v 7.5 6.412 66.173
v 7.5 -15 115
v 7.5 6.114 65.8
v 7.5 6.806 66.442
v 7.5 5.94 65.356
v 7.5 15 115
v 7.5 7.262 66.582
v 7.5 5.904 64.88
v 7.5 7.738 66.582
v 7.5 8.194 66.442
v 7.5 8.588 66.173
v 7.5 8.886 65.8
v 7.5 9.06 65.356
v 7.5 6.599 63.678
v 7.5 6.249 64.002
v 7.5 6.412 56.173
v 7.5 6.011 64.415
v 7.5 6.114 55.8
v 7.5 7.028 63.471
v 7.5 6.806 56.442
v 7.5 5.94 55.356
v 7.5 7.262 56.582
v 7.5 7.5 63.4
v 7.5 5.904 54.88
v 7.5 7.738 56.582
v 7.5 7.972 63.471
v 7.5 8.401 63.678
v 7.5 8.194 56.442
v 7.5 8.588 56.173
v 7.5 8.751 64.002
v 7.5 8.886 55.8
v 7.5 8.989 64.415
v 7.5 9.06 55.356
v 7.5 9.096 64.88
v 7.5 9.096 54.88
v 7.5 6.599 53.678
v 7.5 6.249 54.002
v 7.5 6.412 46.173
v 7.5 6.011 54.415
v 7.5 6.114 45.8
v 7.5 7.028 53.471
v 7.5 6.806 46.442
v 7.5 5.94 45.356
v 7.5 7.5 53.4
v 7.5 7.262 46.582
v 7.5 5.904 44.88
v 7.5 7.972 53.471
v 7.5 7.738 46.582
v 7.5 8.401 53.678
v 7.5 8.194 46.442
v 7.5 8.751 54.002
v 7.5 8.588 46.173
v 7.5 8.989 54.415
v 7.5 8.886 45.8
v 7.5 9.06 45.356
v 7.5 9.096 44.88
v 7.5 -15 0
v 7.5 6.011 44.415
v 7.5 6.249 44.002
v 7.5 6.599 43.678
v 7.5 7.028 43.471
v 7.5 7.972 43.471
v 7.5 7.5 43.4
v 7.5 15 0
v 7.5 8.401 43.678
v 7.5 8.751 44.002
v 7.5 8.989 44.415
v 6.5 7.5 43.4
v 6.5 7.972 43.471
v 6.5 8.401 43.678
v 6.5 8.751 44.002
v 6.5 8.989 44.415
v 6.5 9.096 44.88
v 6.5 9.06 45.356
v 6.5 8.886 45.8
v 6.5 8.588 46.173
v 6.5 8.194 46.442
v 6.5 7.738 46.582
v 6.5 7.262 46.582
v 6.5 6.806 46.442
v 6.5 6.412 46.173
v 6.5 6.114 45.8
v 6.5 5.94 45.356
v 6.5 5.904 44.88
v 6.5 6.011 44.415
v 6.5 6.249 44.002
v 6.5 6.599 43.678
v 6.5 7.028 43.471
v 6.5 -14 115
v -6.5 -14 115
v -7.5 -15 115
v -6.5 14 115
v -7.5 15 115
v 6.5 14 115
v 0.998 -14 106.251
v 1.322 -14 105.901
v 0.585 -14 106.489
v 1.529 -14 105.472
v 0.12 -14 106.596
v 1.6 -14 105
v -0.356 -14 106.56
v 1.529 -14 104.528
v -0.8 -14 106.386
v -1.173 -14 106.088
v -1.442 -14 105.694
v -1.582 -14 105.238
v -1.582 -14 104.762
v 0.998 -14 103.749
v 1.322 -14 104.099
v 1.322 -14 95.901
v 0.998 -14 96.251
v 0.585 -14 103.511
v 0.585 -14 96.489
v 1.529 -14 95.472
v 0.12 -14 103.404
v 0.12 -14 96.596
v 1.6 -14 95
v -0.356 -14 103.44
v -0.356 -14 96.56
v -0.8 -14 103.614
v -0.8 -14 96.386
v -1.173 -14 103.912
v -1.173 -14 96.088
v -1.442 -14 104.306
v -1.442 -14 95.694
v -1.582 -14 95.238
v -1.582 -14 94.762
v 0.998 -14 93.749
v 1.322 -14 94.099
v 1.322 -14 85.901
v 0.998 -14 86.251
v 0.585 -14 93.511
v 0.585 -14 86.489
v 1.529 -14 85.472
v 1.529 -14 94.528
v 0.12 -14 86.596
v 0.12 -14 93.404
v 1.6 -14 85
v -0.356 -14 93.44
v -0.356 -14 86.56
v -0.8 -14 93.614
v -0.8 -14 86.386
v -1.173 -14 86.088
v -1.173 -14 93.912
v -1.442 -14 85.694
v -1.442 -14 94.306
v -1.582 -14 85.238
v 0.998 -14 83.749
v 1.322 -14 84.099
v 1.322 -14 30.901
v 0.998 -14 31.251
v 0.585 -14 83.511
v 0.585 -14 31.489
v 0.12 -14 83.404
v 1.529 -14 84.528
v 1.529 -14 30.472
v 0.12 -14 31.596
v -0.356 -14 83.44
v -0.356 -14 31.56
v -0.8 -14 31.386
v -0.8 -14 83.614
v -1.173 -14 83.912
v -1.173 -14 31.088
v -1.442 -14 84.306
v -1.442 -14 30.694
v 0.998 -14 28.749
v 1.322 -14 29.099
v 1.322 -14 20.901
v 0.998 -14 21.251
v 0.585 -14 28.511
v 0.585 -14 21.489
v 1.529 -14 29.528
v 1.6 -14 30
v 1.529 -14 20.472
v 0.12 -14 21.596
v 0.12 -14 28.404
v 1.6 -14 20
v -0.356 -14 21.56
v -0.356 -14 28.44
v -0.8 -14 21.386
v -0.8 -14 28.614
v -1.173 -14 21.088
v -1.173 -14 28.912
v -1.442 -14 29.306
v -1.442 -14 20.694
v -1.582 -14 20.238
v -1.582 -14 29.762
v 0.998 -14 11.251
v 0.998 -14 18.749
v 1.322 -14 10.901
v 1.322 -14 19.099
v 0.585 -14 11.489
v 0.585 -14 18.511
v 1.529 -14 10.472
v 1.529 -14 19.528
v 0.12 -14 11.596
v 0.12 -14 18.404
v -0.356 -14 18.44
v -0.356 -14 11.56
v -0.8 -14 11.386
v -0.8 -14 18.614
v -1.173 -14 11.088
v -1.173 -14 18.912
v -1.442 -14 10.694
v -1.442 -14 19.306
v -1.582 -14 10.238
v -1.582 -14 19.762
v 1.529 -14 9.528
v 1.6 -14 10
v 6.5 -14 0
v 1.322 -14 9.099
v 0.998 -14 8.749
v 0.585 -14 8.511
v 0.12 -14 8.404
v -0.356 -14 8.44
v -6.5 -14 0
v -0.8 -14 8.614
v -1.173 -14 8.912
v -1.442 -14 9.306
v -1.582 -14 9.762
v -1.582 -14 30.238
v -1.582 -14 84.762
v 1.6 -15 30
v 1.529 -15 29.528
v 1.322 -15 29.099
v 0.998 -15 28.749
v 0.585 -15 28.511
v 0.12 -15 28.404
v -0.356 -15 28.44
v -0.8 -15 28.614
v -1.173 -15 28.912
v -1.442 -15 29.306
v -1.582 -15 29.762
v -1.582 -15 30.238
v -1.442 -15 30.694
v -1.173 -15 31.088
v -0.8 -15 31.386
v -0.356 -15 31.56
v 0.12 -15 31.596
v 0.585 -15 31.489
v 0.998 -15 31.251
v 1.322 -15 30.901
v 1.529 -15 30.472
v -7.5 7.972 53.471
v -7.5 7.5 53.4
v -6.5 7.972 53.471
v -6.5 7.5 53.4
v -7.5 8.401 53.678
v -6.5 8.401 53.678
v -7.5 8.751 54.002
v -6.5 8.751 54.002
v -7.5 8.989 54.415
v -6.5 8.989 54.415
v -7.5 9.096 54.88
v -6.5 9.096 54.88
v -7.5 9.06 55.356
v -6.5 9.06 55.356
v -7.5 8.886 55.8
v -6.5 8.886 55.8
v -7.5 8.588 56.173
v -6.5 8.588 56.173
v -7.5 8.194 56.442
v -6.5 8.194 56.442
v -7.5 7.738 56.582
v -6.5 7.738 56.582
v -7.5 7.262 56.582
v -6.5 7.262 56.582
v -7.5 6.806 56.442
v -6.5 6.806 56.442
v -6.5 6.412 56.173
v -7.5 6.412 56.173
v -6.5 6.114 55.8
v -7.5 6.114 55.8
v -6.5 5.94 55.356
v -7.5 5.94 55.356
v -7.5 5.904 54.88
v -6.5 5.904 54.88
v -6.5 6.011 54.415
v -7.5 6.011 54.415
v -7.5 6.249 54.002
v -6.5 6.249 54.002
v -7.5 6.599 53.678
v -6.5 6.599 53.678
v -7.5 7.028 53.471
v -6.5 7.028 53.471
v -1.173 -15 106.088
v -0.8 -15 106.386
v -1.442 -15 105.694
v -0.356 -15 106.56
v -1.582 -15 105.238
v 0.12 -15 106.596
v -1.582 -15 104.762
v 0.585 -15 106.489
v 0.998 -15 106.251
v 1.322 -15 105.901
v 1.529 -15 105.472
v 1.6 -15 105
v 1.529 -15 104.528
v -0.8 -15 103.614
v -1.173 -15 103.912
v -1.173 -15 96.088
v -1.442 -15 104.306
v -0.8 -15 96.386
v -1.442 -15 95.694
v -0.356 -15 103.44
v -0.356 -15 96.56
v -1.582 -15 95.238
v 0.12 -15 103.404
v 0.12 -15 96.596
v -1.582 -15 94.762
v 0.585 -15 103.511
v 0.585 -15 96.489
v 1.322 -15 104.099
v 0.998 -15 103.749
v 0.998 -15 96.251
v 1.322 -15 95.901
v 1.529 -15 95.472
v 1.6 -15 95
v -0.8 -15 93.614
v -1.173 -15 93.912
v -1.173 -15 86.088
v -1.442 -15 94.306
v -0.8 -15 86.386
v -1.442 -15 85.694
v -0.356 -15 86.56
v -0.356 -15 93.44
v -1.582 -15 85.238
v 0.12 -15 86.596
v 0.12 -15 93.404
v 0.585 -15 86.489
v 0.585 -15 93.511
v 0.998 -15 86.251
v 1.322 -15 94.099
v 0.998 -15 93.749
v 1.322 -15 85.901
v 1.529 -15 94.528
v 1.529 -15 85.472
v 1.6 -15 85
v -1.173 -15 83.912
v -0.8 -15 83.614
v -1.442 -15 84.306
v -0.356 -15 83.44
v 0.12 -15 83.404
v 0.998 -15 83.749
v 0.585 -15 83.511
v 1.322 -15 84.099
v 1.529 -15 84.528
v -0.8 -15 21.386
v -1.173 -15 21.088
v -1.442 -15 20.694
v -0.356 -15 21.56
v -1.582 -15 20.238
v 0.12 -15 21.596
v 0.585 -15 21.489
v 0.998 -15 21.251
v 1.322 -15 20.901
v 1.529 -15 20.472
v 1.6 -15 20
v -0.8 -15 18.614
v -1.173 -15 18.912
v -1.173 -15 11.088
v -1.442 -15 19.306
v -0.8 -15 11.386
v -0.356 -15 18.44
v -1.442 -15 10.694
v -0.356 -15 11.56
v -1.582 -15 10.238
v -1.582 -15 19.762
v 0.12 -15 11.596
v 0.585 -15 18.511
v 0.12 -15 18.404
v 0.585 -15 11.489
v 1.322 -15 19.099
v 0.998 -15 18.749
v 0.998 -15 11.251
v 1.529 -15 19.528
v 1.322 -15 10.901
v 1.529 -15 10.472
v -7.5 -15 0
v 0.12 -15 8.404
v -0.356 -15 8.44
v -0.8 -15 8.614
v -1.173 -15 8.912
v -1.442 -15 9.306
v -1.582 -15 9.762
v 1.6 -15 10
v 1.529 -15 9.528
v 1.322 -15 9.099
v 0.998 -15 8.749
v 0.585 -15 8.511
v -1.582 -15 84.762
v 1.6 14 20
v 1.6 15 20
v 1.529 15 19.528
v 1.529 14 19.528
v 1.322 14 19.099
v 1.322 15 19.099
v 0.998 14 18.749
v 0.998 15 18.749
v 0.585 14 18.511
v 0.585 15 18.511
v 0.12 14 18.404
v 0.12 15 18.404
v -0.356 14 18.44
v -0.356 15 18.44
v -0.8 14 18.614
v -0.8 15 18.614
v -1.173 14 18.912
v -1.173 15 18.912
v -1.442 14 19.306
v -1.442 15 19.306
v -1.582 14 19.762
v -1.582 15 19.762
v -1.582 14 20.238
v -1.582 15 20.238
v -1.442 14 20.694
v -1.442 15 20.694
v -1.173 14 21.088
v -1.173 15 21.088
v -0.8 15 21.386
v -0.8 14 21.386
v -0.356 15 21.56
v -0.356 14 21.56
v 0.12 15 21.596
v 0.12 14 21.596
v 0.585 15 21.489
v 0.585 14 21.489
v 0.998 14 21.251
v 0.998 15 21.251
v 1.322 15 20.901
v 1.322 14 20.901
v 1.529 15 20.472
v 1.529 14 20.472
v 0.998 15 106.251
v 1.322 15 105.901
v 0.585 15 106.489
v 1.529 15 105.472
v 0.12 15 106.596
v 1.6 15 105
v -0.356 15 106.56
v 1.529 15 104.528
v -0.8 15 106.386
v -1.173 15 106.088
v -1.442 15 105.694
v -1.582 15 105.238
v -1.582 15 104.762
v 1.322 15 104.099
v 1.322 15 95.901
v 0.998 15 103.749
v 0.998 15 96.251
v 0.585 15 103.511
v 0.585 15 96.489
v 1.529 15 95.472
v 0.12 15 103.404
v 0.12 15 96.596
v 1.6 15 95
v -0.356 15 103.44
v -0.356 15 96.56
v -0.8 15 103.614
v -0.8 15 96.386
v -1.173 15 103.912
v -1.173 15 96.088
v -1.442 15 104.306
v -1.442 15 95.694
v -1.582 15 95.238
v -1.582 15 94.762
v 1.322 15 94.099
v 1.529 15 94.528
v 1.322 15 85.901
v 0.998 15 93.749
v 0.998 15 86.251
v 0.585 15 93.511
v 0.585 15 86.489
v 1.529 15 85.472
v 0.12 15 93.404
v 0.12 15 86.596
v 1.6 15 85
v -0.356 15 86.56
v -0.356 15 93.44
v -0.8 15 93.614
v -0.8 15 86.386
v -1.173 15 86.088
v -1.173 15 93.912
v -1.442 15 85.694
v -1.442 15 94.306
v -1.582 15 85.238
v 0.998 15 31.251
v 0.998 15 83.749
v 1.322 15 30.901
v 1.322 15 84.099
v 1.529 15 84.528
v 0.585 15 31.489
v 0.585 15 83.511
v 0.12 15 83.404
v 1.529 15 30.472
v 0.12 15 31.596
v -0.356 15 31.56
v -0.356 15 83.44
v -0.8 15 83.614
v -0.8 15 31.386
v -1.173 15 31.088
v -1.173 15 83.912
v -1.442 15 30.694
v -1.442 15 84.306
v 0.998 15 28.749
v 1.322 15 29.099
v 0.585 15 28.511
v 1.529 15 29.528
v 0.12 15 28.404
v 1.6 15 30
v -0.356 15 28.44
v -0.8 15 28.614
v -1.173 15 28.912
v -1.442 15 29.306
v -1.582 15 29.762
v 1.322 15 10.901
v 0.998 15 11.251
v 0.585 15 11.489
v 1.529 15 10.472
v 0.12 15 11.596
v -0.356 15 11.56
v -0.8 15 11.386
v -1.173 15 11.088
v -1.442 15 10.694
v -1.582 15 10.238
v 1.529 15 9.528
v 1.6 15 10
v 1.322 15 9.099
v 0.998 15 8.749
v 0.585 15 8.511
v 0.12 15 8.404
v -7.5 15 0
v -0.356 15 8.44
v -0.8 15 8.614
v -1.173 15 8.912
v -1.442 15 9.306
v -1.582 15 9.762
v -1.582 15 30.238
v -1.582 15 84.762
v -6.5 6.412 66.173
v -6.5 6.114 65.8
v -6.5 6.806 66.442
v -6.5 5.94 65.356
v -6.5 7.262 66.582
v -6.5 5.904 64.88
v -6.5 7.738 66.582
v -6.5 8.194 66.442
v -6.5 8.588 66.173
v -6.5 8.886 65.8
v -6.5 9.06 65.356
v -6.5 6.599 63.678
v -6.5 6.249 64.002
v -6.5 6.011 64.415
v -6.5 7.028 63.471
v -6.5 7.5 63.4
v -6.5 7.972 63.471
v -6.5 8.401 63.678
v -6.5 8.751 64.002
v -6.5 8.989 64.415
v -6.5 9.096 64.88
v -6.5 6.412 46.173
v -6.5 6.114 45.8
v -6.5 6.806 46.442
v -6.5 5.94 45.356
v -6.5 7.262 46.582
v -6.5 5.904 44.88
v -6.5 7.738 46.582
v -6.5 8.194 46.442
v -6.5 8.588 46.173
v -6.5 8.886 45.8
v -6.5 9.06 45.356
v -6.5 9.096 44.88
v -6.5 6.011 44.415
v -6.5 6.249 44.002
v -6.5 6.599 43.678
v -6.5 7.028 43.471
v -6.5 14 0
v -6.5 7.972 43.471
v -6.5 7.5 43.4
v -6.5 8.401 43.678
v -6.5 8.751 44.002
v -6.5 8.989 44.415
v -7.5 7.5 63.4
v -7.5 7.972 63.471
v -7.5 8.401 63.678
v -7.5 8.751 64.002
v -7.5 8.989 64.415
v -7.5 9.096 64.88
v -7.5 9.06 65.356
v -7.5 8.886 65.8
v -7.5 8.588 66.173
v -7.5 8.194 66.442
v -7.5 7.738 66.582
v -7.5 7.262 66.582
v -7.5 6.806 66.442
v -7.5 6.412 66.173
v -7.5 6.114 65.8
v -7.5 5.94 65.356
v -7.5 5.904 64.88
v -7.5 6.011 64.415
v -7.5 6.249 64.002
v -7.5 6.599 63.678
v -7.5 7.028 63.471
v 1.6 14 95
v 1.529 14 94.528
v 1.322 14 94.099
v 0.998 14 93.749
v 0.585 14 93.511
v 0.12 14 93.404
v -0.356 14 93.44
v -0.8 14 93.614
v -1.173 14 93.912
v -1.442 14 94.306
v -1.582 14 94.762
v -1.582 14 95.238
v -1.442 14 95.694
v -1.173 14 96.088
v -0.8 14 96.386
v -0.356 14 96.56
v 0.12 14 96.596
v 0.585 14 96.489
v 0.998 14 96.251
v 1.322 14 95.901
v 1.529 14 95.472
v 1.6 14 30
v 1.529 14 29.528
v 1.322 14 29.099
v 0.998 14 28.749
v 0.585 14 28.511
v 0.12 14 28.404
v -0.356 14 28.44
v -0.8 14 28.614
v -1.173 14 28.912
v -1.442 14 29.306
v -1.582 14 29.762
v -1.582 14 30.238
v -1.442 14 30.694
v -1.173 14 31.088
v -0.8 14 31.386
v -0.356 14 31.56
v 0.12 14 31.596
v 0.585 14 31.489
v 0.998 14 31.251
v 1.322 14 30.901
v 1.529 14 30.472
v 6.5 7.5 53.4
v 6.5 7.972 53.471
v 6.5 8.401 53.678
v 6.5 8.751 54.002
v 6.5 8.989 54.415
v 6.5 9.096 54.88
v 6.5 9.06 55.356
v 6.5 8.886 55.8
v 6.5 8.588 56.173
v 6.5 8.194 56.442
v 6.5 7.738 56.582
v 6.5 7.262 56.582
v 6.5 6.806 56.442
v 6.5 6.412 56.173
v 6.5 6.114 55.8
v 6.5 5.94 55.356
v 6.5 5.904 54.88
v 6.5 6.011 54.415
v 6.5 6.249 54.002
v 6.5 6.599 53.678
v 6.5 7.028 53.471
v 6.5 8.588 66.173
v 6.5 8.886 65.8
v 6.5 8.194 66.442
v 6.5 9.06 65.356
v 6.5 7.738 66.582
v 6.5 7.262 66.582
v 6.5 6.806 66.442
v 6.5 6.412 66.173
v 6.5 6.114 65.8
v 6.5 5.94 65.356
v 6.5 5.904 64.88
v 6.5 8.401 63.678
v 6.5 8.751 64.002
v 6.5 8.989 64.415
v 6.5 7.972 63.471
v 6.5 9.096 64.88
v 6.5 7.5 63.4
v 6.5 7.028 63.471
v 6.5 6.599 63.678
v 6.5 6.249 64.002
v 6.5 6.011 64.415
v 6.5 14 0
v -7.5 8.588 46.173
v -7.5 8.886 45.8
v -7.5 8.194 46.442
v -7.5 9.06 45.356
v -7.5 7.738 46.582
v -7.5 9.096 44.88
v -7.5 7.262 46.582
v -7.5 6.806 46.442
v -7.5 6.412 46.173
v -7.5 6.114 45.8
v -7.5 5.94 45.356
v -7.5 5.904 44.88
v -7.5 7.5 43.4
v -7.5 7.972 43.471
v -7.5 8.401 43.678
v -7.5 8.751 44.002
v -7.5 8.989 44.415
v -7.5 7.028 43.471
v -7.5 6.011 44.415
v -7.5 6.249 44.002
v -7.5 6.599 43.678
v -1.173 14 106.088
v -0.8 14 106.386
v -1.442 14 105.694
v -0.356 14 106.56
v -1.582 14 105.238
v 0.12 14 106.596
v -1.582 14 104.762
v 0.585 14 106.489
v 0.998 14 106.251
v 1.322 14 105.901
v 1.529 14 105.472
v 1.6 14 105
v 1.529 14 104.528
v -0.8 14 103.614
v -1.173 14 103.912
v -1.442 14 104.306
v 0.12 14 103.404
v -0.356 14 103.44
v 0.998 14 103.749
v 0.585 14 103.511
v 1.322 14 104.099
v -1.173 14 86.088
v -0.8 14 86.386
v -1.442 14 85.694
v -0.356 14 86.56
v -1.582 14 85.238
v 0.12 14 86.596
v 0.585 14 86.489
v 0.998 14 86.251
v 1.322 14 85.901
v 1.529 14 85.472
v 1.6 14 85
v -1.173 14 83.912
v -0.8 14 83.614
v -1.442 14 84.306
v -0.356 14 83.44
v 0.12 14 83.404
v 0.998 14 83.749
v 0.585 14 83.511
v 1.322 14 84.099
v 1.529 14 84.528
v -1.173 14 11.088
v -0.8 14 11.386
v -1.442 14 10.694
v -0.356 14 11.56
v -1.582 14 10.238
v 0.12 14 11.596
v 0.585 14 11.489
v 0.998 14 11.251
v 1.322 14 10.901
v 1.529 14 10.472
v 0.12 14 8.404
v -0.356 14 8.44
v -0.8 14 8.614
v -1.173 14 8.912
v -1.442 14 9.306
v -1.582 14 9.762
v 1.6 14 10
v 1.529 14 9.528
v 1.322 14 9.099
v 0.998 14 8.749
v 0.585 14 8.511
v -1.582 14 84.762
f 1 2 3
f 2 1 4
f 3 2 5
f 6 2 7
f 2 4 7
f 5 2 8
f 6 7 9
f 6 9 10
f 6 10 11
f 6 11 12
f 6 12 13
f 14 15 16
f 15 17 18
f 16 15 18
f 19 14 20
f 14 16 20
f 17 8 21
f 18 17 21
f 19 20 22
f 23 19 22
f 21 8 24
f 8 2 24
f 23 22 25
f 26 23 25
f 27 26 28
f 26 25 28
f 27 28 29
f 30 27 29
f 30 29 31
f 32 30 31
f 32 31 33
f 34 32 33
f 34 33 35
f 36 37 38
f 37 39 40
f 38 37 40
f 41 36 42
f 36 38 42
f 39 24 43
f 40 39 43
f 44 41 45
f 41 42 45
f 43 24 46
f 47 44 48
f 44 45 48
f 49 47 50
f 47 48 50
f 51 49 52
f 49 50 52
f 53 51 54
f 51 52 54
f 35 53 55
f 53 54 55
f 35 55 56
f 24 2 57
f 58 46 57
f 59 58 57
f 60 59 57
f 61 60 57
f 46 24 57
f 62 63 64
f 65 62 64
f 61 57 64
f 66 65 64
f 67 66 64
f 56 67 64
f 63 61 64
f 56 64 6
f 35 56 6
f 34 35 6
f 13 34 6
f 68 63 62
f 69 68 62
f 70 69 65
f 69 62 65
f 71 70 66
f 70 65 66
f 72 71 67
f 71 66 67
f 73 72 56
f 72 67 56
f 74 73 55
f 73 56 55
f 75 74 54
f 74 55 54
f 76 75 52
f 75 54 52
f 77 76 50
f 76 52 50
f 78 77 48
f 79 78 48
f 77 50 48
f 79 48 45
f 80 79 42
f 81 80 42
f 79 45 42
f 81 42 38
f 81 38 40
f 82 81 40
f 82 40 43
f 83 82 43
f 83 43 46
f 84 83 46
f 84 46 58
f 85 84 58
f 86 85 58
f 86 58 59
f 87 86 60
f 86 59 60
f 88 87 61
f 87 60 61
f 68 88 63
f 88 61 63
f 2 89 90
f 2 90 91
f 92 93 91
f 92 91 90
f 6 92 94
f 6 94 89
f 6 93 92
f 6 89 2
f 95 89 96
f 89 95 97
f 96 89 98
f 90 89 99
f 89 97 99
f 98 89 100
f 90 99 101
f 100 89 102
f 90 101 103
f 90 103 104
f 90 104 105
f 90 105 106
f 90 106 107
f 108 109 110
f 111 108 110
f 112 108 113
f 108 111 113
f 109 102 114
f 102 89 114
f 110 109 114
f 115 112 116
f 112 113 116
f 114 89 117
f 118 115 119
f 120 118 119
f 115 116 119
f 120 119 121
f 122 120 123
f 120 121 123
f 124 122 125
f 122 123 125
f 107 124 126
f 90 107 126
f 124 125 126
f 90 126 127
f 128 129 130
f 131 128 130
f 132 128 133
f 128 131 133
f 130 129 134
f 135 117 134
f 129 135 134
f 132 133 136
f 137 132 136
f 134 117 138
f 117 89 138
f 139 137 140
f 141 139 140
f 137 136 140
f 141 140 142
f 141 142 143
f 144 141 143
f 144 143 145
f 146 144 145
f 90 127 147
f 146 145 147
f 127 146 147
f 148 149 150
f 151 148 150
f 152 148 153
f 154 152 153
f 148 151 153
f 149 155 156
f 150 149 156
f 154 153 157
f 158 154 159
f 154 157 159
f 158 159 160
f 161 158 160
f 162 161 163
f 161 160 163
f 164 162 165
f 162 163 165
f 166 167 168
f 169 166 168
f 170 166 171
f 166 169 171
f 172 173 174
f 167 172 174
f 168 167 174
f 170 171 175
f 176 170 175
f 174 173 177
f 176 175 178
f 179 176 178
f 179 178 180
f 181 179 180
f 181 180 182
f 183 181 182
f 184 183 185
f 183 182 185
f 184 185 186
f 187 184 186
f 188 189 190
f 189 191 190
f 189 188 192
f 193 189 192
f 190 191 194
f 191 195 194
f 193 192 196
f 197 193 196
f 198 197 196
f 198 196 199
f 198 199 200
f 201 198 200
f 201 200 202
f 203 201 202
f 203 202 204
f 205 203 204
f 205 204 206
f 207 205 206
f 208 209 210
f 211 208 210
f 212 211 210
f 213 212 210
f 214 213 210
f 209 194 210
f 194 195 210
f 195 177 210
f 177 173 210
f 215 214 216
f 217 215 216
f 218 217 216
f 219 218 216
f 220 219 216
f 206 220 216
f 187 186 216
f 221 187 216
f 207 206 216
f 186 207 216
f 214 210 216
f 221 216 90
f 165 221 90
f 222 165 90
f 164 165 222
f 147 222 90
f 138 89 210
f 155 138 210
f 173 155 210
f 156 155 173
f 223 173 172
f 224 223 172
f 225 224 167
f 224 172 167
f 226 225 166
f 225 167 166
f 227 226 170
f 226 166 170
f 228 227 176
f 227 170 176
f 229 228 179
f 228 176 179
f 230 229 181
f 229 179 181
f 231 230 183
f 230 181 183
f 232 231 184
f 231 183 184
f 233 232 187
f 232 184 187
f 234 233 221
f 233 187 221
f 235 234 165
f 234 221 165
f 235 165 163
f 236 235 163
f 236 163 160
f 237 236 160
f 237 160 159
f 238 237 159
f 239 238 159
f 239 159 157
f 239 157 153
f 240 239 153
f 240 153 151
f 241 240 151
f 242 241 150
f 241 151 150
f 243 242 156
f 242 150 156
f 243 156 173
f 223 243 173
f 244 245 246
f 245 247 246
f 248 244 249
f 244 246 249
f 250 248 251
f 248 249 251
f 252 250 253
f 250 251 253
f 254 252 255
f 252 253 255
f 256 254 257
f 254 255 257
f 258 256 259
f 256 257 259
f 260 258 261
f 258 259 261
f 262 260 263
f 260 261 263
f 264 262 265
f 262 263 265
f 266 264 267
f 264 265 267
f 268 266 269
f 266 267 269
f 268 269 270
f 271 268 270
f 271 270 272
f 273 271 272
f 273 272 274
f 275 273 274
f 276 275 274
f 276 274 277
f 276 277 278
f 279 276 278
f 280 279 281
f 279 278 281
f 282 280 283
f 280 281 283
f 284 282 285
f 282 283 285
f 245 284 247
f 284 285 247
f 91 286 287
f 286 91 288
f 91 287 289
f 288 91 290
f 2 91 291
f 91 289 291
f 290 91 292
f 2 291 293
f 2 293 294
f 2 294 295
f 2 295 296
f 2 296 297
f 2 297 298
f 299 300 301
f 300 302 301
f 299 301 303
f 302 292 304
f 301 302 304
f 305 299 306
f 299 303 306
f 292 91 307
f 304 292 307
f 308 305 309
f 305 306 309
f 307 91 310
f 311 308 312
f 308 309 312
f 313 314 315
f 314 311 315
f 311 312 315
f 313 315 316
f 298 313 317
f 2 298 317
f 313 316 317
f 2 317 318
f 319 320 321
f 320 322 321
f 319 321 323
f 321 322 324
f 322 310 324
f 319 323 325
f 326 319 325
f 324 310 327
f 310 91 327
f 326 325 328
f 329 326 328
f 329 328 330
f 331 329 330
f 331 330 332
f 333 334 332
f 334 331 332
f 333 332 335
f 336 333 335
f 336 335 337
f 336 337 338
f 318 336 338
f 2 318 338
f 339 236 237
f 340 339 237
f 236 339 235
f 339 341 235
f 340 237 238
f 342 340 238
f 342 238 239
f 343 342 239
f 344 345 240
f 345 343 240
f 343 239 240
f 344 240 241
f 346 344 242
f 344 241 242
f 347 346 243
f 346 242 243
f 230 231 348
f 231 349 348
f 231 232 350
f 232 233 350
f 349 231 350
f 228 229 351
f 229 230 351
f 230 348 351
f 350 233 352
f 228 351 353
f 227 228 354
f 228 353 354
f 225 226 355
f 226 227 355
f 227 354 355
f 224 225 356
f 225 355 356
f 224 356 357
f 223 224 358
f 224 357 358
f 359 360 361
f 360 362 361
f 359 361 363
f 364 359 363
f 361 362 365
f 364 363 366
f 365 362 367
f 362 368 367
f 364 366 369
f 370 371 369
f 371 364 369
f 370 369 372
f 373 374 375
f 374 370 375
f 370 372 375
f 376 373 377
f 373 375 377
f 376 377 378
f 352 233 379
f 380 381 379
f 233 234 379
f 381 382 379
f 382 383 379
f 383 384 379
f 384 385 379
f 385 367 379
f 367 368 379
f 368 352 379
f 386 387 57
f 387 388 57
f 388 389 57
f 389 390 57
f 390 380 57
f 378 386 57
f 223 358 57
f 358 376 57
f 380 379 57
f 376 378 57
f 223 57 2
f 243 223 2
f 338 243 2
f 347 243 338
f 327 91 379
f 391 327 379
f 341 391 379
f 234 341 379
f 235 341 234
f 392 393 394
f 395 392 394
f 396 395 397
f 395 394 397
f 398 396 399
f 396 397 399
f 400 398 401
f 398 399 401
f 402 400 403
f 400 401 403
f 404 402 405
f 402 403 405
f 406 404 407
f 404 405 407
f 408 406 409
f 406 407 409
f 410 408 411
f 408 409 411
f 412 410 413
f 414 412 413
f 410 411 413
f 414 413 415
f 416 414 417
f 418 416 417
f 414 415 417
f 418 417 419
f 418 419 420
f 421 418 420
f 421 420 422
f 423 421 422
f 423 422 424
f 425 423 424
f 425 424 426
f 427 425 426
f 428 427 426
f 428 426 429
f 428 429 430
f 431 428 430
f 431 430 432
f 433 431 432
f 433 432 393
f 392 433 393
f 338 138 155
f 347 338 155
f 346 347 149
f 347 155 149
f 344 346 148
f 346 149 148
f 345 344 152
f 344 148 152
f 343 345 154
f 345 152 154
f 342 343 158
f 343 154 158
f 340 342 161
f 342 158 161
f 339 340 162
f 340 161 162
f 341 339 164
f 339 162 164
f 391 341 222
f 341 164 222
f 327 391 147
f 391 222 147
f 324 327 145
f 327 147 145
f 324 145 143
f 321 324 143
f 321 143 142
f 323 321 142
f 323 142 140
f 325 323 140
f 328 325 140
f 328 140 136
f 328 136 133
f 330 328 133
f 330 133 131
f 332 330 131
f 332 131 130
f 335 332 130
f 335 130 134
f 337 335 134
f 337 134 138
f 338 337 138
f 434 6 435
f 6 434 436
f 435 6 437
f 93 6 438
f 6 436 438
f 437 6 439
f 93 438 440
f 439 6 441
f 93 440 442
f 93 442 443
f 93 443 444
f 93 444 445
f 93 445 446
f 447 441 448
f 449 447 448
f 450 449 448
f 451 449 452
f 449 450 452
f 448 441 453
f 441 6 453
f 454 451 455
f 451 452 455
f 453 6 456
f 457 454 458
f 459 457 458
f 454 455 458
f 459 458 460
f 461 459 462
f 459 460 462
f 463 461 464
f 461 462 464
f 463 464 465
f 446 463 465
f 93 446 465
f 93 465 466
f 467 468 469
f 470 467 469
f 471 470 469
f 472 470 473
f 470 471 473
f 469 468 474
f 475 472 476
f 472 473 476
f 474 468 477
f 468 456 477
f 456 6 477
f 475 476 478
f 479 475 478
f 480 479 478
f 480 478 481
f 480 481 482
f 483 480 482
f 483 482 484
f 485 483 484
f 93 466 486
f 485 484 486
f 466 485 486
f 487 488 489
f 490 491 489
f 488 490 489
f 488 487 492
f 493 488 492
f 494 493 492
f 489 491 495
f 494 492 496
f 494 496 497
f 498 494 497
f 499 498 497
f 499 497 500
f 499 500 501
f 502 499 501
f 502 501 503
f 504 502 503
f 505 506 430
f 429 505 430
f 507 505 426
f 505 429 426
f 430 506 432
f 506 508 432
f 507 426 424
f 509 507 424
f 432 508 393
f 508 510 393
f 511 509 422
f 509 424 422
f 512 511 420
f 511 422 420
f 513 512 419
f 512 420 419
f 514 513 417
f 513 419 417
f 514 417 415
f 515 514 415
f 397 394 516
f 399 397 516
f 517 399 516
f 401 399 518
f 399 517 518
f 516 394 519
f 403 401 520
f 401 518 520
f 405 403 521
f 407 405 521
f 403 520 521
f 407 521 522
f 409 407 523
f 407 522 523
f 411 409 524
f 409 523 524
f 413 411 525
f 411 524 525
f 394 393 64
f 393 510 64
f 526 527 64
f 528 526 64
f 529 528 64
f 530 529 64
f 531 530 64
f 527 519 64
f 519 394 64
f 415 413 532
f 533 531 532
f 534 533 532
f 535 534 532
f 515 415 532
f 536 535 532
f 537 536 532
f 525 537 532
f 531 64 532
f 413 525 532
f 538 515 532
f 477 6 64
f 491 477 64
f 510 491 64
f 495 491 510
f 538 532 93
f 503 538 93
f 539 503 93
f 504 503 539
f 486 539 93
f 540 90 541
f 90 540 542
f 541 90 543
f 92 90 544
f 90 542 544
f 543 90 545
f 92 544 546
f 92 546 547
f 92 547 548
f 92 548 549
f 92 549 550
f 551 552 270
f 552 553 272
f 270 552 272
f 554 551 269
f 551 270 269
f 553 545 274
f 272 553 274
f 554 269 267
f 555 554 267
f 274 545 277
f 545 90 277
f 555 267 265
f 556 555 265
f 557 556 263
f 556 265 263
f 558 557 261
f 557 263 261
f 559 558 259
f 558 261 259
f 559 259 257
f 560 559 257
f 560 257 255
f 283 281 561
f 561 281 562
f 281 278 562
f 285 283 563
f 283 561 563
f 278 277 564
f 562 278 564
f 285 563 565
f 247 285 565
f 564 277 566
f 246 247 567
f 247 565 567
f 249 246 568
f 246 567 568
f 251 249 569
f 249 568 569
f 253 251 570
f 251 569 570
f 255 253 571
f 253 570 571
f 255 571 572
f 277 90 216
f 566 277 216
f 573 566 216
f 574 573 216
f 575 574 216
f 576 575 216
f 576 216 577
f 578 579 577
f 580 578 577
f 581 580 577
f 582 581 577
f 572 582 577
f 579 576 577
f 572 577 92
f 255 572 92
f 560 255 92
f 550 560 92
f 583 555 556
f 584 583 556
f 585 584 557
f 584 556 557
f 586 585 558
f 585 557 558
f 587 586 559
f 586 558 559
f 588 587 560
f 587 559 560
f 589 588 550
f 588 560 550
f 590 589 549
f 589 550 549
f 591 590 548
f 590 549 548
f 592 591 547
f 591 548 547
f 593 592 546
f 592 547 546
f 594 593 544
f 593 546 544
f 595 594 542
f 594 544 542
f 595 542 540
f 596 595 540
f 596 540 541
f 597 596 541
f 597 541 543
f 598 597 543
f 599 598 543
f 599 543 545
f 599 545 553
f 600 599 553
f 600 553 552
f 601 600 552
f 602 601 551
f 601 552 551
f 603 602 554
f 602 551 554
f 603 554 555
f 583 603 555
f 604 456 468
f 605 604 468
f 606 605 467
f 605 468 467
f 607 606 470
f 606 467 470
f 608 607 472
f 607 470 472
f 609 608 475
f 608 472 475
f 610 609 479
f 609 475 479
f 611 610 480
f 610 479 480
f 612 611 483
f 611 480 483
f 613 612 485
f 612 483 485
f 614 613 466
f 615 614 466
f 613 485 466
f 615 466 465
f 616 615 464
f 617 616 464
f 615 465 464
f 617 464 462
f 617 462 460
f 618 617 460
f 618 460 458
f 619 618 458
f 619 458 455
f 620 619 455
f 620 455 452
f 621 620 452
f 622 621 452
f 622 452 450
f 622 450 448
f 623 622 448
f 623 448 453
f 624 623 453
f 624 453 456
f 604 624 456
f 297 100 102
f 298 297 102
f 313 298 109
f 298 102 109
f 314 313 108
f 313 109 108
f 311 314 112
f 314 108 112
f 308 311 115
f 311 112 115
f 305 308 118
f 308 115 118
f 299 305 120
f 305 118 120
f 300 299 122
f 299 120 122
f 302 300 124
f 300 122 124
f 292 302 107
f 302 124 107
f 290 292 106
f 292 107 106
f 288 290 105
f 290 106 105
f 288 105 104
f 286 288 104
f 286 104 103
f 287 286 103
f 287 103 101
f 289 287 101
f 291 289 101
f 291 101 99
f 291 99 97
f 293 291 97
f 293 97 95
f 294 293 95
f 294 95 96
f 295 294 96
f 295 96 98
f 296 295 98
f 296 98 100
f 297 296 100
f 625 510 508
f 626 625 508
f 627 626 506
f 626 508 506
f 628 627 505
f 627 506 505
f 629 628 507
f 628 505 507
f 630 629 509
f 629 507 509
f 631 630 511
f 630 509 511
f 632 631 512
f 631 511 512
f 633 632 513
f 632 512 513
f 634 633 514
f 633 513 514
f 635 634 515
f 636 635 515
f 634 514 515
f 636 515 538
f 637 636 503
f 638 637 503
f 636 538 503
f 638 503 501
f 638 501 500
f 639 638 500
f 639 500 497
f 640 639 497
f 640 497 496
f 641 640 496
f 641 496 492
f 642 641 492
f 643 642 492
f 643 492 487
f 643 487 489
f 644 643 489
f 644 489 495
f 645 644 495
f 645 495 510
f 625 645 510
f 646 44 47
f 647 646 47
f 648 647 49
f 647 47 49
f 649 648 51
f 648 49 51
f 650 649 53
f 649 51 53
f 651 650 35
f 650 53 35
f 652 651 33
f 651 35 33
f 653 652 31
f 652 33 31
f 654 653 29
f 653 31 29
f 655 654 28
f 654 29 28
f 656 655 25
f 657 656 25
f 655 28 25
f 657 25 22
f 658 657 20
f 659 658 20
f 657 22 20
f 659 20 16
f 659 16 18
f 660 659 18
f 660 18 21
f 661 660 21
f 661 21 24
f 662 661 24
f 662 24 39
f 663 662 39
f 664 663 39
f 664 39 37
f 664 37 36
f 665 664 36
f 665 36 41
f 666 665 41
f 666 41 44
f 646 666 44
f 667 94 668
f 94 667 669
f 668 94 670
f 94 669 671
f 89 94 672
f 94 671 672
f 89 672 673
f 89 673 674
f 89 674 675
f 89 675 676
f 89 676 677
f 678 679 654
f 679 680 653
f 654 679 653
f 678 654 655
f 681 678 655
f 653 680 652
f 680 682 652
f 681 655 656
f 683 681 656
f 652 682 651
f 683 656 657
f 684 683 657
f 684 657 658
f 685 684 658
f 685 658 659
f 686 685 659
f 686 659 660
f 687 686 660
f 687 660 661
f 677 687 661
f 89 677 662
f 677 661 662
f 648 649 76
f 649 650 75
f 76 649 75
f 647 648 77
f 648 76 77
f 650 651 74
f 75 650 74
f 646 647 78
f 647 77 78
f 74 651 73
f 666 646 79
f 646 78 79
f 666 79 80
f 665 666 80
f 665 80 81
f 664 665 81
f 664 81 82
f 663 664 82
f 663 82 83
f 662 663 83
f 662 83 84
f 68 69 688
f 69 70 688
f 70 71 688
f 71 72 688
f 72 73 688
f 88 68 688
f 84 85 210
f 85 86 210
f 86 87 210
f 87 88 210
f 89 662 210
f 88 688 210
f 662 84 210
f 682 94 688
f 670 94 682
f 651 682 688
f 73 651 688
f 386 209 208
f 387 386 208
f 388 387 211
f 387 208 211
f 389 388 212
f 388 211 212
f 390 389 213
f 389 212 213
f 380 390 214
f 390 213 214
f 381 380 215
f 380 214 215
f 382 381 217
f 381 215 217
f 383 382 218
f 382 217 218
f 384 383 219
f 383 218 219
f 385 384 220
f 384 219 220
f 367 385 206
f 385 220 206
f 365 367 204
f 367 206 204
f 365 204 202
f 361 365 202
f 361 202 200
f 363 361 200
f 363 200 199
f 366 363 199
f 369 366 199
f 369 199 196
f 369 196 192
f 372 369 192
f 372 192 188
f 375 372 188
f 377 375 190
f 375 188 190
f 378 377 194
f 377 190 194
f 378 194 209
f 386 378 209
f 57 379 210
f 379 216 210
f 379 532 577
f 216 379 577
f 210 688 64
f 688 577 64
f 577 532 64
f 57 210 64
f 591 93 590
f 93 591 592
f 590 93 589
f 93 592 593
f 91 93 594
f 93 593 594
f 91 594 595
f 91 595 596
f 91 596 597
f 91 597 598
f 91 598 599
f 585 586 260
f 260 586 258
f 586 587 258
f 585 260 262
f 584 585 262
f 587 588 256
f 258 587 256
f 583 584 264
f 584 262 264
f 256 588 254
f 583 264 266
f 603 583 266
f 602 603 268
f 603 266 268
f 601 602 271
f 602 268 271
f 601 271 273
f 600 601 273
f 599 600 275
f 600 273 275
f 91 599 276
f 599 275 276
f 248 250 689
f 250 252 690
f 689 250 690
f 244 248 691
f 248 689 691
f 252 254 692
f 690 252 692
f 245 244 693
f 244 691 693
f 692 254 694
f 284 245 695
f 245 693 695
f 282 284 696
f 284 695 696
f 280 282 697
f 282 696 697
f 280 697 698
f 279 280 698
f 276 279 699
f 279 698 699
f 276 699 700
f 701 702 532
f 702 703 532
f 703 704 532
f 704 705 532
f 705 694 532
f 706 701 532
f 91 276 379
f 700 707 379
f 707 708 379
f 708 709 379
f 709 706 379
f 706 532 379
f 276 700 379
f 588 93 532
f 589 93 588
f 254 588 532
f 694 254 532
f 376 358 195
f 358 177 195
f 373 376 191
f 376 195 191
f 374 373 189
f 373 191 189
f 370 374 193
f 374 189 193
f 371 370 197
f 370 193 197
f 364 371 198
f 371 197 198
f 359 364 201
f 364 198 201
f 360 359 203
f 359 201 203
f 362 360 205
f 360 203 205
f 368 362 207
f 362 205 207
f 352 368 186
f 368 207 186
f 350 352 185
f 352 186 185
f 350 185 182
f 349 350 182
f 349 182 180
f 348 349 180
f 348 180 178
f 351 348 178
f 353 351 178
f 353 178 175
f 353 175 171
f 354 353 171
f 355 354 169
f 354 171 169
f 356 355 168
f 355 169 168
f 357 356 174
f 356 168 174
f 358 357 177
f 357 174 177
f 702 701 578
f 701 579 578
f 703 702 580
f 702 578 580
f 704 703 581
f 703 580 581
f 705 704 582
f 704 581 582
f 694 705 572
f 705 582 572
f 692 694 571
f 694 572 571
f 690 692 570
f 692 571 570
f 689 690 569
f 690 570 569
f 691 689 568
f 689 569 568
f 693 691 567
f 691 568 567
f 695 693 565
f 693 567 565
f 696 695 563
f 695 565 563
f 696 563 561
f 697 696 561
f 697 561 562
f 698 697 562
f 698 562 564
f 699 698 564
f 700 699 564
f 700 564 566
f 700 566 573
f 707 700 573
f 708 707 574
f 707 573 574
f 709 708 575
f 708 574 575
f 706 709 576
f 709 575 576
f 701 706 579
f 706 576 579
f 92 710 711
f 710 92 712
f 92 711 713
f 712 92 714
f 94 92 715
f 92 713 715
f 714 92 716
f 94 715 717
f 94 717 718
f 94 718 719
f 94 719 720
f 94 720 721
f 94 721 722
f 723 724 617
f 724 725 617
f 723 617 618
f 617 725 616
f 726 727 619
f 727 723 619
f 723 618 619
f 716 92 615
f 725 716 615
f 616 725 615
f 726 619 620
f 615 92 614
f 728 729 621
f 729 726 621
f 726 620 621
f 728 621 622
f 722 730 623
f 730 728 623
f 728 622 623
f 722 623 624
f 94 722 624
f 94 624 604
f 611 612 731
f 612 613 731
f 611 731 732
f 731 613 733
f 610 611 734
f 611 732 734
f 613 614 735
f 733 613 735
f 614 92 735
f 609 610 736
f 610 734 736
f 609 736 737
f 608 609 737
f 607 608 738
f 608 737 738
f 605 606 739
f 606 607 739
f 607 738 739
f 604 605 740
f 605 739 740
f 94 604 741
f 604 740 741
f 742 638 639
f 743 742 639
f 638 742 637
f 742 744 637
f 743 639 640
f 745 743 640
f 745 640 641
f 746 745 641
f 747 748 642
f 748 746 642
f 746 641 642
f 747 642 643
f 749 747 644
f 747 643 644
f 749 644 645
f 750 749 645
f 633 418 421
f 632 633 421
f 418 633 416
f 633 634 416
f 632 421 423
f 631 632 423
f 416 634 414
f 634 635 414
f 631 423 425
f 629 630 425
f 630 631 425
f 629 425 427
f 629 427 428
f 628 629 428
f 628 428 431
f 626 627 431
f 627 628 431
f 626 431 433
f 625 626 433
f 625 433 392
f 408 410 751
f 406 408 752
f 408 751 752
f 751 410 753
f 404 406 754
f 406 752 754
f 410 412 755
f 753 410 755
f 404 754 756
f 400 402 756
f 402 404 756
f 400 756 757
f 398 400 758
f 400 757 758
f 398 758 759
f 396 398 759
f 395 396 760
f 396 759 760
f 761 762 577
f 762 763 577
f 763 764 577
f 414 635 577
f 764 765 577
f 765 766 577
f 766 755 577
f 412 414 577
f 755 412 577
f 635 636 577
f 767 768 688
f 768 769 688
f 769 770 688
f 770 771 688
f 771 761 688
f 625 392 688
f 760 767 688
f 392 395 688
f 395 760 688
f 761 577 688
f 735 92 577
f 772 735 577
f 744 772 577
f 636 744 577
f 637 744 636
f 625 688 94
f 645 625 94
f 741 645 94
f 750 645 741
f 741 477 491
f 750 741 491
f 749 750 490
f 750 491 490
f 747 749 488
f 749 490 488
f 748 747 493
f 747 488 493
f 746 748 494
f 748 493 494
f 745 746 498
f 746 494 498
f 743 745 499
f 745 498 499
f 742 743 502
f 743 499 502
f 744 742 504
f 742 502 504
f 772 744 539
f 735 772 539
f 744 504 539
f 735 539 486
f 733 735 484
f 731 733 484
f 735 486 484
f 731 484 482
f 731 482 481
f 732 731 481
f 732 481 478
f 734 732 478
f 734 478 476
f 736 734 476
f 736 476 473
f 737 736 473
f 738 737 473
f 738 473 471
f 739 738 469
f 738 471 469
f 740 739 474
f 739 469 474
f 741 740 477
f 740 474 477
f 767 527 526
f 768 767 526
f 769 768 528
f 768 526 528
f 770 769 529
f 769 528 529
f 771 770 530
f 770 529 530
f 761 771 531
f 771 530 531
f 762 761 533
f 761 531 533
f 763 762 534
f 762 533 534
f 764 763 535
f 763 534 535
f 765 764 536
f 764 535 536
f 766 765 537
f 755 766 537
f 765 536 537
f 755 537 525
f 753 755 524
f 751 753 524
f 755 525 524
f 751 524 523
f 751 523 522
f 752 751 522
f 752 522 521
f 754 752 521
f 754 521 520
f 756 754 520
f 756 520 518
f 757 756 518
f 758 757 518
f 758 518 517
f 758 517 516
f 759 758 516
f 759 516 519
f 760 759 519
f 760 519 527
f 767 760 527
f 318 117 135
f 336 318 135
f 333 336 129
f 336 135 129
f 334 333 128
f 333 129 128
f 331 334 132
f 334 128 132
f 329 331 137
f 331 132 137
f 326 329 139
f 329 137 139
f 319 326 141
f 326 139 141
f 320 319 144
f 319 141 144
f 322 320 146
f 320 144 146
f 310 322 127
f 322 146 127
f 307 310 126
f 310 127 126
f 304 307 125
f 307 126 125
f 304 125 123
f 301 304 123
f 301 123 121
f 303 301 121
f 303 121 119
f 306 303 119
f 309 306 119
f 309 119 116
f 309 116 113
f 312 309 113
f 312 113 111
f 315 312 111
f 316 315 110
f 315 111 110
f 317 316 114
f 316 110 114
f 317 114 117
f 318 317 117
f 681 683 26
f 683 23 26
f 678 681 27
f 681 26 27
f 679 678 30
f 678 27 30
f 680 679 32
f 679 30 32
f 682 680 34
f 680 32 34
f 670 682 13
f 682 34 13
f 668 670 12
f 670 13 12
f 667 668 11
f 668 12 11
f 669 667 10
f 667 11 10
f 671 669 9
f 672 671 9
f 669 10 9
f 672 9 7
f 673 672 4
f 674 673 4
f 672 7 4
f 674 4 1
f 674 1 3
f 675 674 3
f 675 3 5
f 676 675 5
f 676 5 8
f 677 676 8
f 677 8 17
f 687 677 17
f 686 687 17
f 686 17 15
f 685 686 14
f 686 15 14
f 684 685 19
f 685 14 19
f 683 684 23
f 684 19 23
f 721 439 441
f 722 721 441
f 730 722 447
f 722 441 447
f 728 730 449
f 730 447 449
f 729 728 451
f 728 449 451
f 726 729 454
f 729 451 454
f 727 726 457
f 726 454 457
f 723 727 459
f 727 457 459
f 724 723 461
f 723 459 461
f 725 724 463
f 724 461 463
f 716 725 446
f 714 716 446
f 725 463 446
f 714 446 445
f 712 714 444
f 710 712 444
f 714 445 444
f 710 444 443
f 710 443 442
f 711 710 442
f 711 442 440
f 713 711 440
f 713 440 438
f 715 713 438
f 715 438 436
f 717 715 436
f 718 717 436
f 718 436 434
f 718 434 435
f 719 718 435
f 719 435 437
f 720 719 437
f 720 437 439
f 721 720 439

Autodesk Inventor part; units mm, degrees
ref_plane "YZ Plane" through (0, 0, 0) normal (1, 0, 0) x (0, 1, 0)
ref_plane "XZ Plane" through (0, 0, 0) normal (0, 1, 0) x (-1, 0, 0)
ref_plane "XY Plane" through (0, 0, 0) normal (0, 0, 1) x (1, 0, 0)
sketch "スケッチ1" plane through (0, 0, 0) normal (0, 0, 1) x (1, 0, 0)
  line L0 (7.5, 15) -> (-7.5, 15)
  line L1 (-7.5, 15) -> (-7.5, -15)
  line L2 (-7.5, -15) -> (7.5, -15)
  line L3 (7.5, -15) -> (7.5, 15)
  line L4 (7.5, 15) -> (-7.5, -15) construction
  line L5 (-7.5, 15) -> (7.5, -15) construction
  line L6 (-6.5, 14) -> (6.5, 14)
  line L7 (6.5, 14) -> (6.5, -14)
  line L8 (6.5, -14) -> (-6.5, -14)
  line L9 (-6.5, -14) -> (-6.5, 14)
  point P0 (0, 0)
  dimension "d0" = 15
  dimension "d1" = 30
  dimension "d2" = 1
extrude "押し出し1" add sketch "スケッチ1" along normal blind 115
sketch "スケッチ2" plane through (-7.5, 15, 0) normal (0, 1, 0) x (1, 0, 0)
  circle A0 centre (7.5, -10) radius 1.6
  circle A1 centre (7.5, -20) radius 1.6
  circle A2 centre (7.5, -30) radius 1.6
  circle A3 centre (7.5, -105) radius 1.6
  circle A4 centre (7.5, -95) radius 1.6
  circle A5 centre (7.5, -85) radius 1.6
  line L0 (15, -115) -> (0, -115) projected
  line L1 (15, 0) -> (0, 0) projected
  point P0 (7.5, 0)
  point P1 (7.5, 0)
  dimension "d5" = 3.2
  dimension "d6" = 3.2
  dimension "d7" = 3.2
  dimension "d8" = 3.2
  dimension "d9" = 3.2
  dimension "d10" = 3.2
  dimension "d11" = 10
  dimension "d12" = 10
  dimension "d13" = 10
  dimension "d14" = 10
  dimension "d15" = 10
  dimension "d16" = 10
extrude "押し出し2" cut sketch "スケッチ2" against normal through all
sketch "スケッチ3" plane through (7.5, -15, 0) normal (1, 0, 0) x (0, 0, -1)
  circle A0 centre (-65, 22.5) radius 1.6
  circle A1 centre (-55, 22.5) radius 1.6
  circle A2 centre (-45, 22.5) radius 1.6
  line L0 (0, 0) -> (0, 30) projected
  line L1 (0, 30) -> (-115, 30) projected
  point P0 (0, 15)
  dimension "d19" = 3.2
  dimension "d20" = 3.2
  dimension "d21" = 3.2
  dimension "d22" = 10
  dimension "d23" = 10
  dimension "d24" = 45
  dimension "d25" = 7.5
extrude "押し出し3" cut sketch "スケッチ3" against normal through all
properties part number "オムニ_角柱7" material "アルミニウム 6061"
